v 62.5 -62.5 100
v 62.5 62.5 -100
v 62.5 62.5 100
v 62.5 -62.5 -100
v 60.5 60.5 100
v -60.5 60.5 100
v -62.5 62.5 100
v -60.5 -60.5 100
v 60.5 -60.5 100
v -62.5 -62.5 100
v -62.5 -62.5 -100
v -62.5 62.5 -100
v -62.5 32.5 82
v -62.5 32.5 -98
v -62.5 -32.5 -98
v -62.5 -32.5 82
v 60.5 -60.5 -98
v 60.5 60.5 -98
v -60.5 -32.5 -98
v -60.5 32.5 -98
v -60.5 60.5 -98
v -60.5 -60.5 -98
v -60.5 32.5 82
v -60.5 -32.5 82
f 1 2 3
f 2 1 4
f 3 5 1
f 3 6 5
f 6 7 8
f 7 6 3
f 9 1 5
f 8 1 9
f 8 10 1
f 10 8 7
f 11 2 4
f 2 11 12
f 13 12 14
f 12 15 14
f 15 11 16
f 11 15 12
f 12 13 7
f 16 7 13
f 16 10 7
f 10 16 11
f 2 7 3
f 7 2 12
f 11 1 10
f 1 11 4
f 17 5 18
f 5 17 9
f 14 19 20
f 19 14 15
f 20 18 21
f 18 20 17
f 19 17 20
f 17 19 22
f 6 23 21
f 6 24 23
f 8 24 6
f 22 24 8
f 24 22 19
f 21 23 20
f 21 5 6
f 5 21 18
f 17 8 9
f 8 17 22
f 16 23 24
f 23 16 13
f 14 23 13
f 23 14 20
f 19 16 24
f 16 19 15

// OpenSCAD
cabin_width=125;
cabin_height=200;
cabin_wall_thickness=2;
cabin_floor_thickness=2;
door_width=65;
door_height=180;

module cabin(
    cw=cabin_width,
    ch=cabin_height,
    ct=cabin_wall_thickness,
    cf=cabin_floor_thickness,
    dw=door_width,
    dh=door_height
) {
    difference(){
            // cabin outer dimensions
            cube([cw,cw,ch],true);
            // cabin inner dimensions
            translate([0,0,cf])
                    cube([cw-2*ct,cw-2*ct,ch],true); 
            // doorway punch  
            translate([(cabin_width)/-2,0,cf-(ch-dh)/2])
                cube([cw,dw,dh],true);
   }
}

cabin();
